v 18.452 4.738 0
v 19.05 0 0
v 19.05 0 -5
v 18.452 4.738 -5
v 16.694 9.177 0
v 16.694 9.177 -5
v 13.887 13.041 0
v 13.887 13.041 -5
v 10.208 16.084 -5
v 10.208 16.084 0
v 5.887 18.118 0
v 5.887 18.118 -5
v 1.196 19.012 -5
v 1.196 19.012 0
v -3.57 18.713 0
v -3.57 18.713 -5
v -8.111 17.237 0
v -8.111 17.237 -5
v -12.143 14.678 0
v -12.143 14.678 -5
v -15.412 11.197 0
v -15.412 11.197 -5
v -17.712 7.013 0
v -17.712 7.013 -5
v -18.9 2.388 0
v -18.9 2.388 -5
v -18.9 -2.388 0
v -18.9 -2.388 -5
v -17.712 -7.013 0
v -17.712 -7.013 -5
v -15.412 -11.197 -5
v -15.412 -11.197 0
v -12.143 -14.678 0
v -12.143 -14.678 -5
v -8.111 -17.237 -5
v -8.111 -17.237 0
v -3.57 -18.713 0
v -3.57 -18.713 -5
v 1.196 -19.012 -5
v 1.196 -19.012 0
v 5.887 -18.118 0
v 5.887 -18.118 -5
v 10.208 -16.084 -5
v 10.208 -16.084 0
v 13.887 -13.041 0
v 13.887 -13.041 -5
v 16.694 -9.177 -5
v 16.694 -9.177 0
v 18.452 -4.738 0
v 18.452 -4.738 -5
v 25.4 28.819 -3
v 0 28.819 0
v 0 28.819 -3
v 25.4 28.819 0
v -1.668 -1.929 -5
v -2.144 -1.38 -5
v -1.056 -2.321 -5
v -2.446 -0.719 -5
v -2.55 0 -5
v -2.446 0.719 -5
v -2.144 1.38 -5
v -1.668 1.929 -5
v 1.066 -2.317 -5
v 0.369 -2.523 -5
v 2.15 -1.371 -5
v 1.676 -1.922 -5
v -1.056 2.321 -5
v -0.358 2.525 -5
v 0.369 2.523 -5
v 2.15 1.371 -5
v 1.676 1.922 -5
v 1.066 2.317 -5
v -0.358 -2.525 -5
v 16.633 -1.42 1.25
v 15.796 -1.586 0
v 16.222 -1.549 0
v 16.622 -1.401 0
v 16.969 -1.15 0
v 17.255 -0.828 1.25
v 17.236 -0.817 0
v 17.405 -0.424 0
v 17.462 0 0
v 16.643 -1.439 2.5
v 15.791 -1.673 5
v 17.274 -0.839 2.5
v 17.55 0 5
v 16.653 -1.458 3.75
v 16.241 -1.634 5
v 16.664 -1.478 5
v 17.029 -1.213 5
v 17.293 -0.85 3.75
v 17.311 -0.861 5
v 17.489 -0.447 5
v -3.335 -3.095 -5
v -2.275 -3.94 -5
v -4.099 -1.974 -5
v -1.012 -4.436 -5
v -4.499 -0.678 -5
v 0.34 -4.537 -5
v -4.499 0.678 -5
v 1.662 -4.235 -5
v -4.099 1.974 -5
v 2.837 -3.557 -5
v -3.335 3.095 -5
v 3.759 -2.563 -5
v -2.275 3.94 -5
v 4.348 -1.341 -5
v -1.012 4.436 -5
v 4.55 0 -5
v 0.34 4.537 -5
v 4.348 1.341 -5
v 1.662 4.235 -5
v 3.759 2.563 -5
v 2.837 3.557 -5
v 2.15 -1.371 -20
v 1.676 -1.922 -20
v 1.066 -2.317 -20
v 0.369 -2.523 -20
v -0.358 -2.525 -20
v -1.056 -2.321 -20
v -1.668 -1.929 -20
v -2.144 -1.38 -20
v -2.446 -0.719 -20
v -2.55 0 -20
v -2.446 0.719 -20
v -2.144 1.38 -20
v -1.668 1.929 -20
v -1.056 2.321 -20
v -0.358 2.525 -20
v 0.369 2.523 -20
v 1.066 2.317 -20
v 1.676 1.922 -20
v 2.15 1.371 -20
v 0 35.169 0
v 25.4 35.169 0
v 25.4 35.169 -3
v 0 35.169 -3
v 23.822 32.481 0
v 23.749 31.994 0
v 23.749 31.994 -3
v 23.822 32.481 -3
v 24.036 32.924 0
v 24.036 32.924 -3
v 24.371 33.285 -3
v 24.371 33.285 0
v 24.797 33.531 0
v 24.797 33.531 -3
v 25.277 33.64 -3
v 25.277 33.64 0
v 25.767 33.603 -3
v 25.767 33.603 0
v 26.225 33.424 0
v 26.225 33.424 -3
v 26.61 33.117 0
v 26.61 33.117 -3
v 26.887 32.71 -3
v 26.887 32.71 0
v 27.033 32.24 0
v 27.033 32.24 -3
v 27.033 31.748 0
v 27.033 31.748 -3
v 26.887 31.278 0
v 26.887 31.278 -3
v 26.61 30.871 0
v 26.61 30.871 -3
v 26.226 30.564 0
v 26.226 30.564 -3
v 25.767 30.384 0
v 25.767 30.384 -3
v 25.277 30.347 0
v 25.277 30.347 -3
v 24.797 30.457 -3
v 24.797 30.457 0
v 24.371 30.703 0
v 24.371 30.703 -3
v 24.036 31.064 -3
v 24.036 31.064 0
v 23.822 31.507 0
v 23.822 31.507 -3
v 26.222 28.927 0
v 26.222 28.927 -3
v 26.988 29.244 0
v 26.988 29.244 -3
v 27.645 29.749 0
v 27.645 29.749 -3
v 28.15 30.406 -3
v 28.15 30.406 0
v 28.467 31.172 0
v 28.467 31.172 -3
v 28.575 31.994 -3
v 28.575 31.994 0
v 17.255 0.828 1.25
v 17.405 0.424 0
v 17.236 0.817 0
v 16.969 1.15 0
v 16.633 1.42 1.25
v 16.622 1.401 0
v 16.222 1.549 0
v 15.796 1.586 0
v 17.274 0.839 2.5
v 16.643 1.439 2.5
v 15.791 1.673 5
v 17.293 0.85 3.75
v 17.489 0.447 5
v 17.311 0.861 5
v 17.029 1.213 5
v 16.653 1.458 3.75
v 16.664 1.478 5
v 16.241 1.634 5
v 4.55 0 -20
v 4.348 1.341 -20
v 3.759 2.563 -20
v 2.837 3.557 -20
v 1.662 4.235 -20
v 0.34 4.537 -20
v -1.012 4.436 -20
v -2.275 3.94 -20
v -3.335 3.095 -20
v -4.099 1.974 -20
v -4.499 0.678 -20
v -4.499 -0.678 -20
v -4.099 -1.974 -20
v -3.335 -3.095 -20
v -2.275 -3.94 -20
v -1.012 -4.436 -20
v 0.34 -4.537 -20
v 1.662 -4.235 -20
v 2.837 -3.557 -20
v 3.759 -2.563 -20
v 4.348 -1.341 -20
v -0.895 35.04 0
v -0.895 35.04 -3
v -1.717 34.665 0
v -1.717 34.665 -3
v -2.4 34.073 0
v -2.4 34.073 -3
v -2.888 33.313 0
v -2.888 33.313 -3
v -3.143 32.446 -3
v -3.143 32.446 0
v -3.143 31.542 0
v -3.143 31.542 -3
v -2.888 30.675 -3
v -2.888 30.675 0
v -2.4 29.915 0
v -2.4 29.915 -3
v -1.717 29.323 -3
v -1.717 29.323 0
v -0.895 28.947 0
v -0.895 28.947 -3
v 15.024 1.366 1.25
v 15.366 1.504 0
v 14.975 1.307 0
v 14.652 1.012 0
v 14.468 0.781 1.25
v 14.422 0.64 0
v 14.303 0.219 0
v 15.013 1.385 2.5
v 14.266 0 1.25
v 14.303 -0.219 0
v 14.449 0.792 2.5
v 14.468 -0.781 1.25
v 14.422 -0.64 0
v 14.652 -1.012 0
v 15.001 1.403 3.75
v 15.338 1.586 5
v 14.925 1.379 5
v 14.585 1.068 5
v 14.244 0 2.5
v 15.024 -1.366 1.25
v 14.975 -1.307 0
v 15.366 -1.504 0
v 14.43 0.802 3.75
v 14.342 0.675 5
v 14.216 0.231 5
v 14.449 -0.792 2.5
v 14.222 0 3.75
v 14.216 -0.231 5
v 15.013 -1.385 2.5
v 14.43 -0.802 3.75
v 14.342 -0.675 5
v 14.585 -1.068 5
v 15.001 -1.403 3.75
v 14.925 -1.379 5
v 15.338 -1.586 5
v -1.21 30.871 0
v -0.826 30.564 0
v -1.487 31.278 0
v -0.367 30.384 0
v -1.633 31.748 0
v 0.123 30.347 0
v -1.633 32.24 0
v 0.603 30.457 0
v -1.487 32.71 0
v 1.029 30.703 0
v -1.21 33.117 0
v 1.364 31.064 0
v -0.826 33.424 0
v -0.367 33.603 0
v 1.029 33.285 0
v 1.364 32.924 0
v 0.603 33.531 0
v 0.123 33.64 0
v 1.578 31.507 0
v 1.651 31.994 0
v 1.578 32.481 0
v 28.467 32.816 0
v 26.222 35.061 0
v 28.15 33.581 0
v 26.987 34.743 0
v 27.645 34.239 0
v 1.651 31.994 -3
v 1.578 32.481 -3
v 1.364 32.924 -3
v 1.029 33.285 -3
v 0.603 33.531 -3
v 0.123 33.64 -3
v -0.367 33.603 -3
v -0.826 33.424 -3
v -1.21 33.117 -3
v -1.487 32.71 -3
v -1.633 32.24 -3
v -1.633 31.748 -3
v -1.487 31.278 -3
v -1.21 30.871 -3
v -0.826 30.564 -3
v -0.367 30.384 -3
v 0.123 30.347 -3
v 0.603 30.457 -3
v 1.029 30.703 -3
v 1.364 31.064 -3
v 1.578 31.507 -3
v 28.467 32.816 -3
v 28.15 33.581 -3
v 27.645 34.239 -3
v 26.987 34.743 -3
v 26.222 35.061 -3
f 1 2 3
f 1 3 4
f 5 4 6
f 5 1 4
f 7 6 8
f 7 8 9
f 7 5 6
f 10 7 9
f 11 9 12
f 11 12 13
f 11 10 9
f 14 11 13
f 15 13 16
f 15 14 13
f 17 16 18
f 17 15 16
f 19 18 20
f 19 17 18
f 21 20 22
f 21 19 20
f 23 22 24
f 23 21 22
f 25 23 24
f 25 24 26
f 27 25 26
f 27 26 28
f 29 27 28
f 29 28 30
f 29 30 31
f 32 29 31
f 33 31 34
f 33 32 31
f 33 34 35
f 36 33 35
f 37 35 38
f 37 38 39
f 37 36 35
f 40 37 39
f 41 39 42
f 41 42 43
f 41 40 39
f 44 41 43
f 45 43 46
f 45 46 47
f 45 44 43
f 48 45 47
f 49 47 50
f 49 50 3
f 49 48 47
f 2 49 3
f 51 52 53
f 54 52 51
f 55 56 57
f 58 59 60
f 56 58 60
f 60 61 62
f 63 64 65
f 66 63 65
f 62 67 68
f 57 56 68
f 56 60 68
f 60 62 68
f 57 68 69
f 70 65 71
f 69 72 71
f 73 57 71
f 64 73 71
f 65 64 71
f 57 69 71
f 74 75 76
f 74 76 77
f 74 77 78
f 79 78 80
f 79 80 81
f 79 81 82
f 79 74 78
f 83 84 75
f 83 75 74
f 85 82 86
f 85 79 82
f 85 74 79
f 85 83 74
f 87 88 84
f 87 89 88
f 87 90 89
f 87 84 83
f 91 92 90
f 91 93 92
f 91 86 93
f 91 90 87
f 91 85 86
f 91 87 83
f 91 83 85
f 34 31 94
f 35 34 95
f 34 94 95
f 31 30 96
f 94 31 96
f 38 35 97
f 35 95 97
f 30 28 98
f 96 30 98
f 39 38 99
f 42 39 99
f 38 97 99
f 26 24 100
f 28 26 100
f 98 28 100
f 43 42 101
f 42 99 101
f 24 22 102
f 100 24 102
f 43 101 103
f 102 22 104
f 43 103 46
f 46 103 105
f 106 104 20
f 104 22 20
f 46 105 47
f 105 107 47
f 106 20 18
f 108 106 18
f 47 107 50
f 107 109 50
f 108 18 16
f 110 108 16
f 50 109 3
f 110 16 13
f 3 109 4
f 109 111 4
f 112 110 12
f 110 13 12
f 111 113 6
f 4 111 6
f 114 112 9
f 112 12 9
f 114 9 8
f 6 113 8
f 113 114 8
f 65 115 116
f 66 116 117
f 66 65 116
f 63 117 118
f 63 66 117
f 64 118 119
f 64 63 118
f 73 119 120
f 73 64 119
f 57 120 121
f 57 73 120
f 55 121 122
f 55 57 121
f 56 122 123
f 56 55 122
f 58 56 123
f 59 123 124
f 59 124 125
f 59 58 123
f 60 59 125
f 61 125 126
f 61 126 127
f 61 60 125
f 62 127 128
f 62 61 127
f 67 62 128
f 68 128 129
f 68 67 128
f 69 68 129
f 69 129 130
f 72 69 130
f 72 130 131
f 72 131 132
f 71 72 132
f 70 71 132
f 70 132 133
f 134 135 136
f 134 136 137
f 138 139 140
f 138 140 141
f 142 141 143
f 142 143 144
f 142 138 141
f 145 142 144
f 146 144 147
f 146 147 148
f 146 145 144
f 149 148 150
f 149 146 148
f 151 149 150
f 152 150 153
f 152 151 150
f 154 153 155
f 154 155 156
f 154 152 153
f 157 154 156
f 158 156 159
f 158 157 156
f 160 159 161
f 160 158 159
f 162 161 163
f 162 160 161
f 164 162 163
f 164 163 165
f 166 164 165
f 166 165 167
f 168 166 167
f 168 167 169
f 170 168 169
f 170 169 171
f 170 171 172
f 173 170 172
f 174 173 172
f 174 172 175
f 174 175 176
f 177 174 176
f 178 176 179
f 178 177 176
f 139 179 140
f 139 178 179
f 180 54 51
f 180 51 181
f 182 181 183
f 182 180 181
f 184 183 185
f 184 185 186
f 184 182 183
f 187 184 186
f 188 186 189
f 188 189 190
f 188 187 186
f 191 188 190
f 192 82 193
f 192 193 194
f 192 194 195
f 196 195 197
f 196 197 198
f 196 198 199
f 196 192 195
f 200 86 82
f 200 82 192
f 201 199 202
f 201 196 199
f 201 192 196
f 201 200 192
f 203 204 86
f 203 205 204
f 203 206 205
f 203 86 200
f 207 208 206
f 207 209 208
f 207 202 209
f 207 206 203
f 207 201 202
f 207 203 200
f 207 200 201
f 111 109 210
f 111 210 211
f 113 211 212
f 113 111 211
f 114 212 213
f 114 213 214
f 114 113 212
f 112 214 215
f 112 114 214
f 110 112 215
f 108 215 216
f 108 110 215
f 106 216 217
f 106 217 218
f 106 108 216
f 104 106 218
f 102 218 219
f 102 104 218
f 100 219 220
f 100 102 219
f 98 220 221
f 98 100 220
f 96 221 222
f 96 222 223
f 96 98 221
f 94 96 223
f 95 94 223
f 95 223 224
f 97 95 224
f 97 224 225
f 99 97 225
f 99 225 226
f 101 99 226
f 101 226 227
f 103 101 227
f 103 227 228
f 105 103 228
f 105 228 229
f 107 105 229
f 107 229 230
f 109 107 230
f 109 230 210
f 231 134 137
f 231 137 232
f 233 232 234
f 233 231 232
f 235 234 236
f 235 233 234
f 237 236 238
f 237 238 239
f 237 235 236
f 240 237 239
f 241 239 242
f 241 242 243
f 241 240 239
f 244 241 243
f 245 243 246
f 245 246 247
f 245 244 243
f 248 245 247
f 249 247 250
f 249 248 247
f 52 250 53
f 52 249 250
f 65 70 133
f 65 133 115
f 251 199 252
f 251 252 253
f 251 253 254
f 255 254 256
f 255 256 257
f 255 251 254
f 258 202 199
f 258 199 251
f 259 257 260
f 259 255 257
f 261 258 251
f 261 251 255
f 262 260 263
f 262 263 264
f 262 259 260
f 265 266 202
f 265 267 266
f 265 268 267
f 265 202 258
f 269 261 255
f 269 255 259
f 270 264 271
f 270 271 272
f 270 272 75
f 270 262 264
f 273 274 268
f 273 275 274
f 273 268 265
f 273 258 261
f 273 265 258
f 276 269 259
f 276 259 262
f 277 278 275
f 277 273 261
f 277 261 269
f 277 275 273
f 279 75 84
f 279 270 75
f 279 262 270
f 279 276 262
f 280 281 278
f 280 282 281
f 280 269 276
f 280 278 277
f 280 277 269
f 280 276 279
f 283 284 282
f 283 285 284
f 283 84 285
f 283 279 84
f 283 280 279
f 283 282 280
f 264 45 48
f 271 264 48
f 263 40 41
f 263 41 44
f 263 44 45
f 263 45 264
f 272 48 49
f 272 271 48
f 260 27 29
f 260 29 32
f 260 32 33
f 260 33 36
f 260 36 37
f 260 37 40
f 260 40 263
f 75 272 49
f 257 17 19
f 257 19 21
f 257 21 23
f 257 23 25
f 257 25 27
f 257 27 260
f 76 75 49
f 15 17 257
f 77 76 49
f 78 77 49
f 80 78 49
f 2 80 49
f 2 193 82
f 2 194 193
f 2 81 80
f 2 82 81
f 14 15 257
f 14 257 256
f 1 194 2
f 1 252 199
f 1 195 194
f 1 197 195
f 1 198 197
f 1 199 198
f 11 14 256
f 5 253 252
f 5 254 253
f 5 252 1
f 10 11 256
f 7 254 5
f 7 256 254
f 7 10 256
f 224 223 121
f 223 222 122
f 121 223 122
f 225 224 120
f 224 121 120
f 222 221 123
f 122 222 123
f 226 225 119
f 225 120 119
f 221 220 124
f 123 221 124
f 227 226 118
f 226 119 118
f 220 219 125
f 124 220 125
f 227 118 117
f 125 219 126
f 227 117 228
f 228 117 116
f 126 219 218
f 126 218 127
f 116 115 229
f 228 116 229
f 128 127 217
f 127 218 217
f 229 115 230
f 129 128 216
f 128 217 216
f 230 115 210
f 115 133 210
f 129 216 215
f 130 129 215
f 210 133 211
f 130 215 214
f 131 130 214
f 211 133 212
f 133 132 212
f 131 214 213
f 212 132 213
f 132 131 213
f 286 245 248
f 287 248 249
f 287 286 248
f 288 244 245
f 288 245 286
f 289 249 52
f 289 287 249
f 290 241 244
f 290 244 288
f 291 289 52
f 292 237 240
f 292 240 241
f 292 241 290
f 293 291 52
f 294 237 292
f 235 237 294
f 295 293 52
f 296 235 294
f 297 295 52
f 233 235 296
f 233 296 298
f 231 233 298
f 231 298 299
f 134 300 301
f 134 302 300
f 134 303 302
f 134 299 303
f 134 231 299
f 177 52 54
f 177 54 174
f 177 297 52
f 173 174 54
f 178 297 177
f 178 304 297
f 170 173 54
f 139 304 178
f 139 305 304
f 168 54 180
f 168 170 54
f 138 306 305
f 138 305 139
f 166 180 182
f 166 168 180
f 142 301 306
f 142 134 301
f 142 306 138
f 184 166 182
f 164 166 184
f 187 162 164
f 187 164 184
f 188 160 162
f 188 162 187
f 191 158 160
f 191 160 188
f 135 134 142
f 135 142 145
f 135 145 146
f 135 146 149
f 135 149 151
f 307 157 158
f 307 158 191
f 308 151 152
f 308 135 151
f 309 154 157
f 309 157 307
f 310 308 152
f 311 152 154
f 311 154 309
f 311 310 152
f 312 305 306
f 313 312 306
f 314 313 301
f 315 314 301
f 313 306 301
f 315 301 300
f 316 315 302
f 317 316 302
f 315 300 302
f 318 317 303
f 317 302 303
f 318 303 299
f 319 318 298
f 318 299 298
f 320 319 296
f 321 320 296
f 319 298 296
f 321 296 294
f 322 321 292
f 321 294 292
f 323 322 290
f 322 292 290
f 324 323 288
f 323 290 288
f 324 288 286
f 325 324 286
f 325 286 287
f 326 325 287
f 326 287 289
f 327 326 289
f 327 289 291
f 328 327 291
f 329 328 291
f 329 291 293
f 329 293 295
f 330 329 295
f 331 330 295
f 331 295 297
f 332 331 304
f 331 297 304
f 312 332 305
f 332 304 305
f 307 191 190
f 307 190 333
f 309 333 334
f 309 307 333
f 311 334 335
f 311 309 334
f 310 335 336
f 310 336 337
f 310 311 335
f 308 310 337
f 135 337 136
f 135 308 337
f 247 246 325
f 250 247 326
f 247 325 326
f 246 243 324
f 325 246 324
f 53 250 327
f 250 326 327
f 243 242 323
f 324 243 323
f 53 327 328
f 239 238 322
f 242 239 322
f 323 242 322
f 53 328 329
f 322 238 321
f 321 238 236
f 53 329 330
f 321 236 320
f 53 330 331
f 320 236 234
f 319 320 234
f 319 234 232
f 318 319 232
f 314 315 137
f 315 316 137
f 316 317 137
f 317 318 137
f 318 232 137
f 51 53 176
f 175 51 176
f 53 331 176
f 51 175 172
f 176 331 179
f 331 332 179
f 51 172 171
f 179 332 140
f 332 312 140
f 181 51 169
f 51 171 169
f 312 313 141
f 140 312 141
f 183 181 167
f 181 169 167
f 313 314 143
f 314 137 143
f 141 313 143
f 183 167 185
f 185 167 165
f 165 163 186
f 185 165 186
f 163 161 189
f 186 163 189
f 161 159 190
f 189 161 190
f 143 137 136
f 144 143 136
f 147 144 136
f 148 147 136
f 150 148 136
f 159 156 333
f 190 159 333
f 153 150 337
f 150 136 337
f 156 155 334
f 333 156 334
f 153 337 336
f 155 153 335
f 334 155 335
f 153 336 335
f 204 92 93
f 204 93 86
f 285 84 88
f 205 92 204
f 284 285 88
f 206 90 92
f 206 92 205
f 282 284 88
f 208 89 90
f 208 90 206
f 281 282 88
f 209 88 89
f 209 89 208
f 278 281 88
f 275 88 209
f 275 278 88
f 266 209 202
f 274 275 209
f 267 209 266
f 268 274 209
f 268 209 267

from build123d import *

# Parameters (mm, degrees)
F1_DEPTH = 5
F0_R     = 19.05
F0_R_2   = 4.55
F2_DEPTH = 20
F4_DEPTH = 5
F4_TAPER = -1
F0_R_3   = 1.651
F5_DEPTH = 3


with BuildPart() as f1:
    # F0 (on Top) → F1 (new body)
    with BuildSketch(Plane.XY):
        with BuildLine():
            Line((2.15, -1.3711309201), (2.15, 1.3711309201))
            ThreePointArc((2.15, 1.3711309201), (-2.55, 0), (2.15, -1.3711309201))
        make_face()
    extrude(amount=-F1_DEPTH)



with BuildPart() as f1b:
    # F0 (on Top) → F1, piece 2 (new body)
    with BuildSketch(Plane.XY):
        Circle(F0_R)
        Circle(F0_R_2, mode=Mode.SUBTRACT)
    extrude(amount=-F1_DEPTH)


with BuildPart() as f1_1:
    add(f1.part)

    add(f1b.part)  # F2 merges F1b
    # F0 (on Top) → F2 (join)
    with BuildSketch(Plane.XY):
        Circle(F0_R_2)
        with BuildLine():
            ThreePointArc((2.15, -1.3711309201), (-2.55, 0), (2.15, 1.3711309201))
            Line((2.15, 1.3711309201), (2.15, -1.3711309201))
        make_face(mode=Mode.SUBTRACT)
    extrude(amount=-F2_DEPTH)

    # F3 (on face) → F4 (join)
    with BuildSketch(Plane.XY):
        with BuildLine():
            ThreePointArc((15.795625, -1.5855143832), (15.8551438321, -0.79375), (15.875, 0))
            ThreePointArc((15.875, 0), (15.8551438321, 0.79375), (15.795625, 1.5855143832))
            ThreePointArc((15.795625, 1.5855143832), (14.2875, 0), (15.795625, -1.5855143832))
        make_face()
        with BuildLine():
            ThreePointArc((15.795625, 1.5855143832), (15.8551438321, 0.79375), (15.875, 0))
            ThreePointArc((15.875, 0), (15.8551438321, -0.79375), (15.795625, -1.5855143832))
            ThreePointArc((15.795625, -1.5855143832), (16.9691088697, -1.1502530292), (17.4625, 0))
            ThreePointArc((17.4625, 0), (16.9691088697, 1.1502530292), (15.795625, 1.5855143832))
        make_face()
    extrude(amount=F4_DEPTH, taper=F4_TAPER)


with BuildPart() as f5:
    # F0 (on Top) → F5 (new body)
    with BuildSketch(Plane.XY):
        with BuildLine():
            ThreePointArc((0, 28.8188606562), (2.2450640303, 29.7487966259), (3.175, 31.9938606562))
            ThreePointArc((3.175, 31.9938606562), (2.2450640303, 34.2389246864), (0, 35.1688606562))
            ThreePointArc((0, 35.1688606562), (-3.175, 31.9938606562), (0, 28.8188606562))
        make_face()
        with Locations((0, 31.9938606562)):
            Circle(F0_R_3, mode=Mode.SUBTRACT)
        with BuildLine():
            Line((22.225, 31.9938606562), (3.175, 31.9938606562))
            ThreePointArc((3.175, 31.9938606562), (2.2450640303, 29.7487966259), (0, 28.8188606562))
            Line((0, 28.8188606562), (25.4, 28.8188606562))
            ThreePointArc((25.4, 28.8188606562), (23.1549359697, 29.7487966259), (22.225, 31.9938606562))
        make_face()
        with BuildLine():
            ThreePointArc((0, 35.1688606562), (2.2450640303, 34.2389246864), (3.175, 31.9938606562))
            Line((3.175, 31.9938606562), (22.225, 31.9938606562))
            ThreePointArc((22.225, 31.9938606562), (23.1549359697, 34.2389246864), (25.4, 35.1688606562))
            Line((25.4, 35.1688606562), (0, 35.1688606562))
        make_face()
        with BuildLine():
            ThreePointArc((25.4, 35.1688606562), (23.1549359697, 34.2389246864), (22.225, 31.9938606562))
            ThreePointArc((22.225, 31.9938606562), (23.1549359697, 29.7487966259), (25.4, 28.8188606562))
            ThreePointArc((25.4, 28.8188606562), (27.6450640303, 29.7487966259), (28.575, 31.9938606562))
            ThreePointArc((28.575, 31.9938606562), (27.6450640303, 34.2389246864), (25.4, 35.1688606562))
        make_face()
        with BuildLine():
            ThreePointArc((27.051, 31.9938606562), (25.4, 30.3428606562), (23.749, 31.9938606562))
            ThreePointArc((23.749, 31.9938606562), (25.4, 33.6448606562), (27.051, 31.9938606562))
        make_face(mode=Mode.SUBTRACT)
    extrude(amount=-F5_DEPTH)


solid = Compound([f1_1.part, f5.part])
